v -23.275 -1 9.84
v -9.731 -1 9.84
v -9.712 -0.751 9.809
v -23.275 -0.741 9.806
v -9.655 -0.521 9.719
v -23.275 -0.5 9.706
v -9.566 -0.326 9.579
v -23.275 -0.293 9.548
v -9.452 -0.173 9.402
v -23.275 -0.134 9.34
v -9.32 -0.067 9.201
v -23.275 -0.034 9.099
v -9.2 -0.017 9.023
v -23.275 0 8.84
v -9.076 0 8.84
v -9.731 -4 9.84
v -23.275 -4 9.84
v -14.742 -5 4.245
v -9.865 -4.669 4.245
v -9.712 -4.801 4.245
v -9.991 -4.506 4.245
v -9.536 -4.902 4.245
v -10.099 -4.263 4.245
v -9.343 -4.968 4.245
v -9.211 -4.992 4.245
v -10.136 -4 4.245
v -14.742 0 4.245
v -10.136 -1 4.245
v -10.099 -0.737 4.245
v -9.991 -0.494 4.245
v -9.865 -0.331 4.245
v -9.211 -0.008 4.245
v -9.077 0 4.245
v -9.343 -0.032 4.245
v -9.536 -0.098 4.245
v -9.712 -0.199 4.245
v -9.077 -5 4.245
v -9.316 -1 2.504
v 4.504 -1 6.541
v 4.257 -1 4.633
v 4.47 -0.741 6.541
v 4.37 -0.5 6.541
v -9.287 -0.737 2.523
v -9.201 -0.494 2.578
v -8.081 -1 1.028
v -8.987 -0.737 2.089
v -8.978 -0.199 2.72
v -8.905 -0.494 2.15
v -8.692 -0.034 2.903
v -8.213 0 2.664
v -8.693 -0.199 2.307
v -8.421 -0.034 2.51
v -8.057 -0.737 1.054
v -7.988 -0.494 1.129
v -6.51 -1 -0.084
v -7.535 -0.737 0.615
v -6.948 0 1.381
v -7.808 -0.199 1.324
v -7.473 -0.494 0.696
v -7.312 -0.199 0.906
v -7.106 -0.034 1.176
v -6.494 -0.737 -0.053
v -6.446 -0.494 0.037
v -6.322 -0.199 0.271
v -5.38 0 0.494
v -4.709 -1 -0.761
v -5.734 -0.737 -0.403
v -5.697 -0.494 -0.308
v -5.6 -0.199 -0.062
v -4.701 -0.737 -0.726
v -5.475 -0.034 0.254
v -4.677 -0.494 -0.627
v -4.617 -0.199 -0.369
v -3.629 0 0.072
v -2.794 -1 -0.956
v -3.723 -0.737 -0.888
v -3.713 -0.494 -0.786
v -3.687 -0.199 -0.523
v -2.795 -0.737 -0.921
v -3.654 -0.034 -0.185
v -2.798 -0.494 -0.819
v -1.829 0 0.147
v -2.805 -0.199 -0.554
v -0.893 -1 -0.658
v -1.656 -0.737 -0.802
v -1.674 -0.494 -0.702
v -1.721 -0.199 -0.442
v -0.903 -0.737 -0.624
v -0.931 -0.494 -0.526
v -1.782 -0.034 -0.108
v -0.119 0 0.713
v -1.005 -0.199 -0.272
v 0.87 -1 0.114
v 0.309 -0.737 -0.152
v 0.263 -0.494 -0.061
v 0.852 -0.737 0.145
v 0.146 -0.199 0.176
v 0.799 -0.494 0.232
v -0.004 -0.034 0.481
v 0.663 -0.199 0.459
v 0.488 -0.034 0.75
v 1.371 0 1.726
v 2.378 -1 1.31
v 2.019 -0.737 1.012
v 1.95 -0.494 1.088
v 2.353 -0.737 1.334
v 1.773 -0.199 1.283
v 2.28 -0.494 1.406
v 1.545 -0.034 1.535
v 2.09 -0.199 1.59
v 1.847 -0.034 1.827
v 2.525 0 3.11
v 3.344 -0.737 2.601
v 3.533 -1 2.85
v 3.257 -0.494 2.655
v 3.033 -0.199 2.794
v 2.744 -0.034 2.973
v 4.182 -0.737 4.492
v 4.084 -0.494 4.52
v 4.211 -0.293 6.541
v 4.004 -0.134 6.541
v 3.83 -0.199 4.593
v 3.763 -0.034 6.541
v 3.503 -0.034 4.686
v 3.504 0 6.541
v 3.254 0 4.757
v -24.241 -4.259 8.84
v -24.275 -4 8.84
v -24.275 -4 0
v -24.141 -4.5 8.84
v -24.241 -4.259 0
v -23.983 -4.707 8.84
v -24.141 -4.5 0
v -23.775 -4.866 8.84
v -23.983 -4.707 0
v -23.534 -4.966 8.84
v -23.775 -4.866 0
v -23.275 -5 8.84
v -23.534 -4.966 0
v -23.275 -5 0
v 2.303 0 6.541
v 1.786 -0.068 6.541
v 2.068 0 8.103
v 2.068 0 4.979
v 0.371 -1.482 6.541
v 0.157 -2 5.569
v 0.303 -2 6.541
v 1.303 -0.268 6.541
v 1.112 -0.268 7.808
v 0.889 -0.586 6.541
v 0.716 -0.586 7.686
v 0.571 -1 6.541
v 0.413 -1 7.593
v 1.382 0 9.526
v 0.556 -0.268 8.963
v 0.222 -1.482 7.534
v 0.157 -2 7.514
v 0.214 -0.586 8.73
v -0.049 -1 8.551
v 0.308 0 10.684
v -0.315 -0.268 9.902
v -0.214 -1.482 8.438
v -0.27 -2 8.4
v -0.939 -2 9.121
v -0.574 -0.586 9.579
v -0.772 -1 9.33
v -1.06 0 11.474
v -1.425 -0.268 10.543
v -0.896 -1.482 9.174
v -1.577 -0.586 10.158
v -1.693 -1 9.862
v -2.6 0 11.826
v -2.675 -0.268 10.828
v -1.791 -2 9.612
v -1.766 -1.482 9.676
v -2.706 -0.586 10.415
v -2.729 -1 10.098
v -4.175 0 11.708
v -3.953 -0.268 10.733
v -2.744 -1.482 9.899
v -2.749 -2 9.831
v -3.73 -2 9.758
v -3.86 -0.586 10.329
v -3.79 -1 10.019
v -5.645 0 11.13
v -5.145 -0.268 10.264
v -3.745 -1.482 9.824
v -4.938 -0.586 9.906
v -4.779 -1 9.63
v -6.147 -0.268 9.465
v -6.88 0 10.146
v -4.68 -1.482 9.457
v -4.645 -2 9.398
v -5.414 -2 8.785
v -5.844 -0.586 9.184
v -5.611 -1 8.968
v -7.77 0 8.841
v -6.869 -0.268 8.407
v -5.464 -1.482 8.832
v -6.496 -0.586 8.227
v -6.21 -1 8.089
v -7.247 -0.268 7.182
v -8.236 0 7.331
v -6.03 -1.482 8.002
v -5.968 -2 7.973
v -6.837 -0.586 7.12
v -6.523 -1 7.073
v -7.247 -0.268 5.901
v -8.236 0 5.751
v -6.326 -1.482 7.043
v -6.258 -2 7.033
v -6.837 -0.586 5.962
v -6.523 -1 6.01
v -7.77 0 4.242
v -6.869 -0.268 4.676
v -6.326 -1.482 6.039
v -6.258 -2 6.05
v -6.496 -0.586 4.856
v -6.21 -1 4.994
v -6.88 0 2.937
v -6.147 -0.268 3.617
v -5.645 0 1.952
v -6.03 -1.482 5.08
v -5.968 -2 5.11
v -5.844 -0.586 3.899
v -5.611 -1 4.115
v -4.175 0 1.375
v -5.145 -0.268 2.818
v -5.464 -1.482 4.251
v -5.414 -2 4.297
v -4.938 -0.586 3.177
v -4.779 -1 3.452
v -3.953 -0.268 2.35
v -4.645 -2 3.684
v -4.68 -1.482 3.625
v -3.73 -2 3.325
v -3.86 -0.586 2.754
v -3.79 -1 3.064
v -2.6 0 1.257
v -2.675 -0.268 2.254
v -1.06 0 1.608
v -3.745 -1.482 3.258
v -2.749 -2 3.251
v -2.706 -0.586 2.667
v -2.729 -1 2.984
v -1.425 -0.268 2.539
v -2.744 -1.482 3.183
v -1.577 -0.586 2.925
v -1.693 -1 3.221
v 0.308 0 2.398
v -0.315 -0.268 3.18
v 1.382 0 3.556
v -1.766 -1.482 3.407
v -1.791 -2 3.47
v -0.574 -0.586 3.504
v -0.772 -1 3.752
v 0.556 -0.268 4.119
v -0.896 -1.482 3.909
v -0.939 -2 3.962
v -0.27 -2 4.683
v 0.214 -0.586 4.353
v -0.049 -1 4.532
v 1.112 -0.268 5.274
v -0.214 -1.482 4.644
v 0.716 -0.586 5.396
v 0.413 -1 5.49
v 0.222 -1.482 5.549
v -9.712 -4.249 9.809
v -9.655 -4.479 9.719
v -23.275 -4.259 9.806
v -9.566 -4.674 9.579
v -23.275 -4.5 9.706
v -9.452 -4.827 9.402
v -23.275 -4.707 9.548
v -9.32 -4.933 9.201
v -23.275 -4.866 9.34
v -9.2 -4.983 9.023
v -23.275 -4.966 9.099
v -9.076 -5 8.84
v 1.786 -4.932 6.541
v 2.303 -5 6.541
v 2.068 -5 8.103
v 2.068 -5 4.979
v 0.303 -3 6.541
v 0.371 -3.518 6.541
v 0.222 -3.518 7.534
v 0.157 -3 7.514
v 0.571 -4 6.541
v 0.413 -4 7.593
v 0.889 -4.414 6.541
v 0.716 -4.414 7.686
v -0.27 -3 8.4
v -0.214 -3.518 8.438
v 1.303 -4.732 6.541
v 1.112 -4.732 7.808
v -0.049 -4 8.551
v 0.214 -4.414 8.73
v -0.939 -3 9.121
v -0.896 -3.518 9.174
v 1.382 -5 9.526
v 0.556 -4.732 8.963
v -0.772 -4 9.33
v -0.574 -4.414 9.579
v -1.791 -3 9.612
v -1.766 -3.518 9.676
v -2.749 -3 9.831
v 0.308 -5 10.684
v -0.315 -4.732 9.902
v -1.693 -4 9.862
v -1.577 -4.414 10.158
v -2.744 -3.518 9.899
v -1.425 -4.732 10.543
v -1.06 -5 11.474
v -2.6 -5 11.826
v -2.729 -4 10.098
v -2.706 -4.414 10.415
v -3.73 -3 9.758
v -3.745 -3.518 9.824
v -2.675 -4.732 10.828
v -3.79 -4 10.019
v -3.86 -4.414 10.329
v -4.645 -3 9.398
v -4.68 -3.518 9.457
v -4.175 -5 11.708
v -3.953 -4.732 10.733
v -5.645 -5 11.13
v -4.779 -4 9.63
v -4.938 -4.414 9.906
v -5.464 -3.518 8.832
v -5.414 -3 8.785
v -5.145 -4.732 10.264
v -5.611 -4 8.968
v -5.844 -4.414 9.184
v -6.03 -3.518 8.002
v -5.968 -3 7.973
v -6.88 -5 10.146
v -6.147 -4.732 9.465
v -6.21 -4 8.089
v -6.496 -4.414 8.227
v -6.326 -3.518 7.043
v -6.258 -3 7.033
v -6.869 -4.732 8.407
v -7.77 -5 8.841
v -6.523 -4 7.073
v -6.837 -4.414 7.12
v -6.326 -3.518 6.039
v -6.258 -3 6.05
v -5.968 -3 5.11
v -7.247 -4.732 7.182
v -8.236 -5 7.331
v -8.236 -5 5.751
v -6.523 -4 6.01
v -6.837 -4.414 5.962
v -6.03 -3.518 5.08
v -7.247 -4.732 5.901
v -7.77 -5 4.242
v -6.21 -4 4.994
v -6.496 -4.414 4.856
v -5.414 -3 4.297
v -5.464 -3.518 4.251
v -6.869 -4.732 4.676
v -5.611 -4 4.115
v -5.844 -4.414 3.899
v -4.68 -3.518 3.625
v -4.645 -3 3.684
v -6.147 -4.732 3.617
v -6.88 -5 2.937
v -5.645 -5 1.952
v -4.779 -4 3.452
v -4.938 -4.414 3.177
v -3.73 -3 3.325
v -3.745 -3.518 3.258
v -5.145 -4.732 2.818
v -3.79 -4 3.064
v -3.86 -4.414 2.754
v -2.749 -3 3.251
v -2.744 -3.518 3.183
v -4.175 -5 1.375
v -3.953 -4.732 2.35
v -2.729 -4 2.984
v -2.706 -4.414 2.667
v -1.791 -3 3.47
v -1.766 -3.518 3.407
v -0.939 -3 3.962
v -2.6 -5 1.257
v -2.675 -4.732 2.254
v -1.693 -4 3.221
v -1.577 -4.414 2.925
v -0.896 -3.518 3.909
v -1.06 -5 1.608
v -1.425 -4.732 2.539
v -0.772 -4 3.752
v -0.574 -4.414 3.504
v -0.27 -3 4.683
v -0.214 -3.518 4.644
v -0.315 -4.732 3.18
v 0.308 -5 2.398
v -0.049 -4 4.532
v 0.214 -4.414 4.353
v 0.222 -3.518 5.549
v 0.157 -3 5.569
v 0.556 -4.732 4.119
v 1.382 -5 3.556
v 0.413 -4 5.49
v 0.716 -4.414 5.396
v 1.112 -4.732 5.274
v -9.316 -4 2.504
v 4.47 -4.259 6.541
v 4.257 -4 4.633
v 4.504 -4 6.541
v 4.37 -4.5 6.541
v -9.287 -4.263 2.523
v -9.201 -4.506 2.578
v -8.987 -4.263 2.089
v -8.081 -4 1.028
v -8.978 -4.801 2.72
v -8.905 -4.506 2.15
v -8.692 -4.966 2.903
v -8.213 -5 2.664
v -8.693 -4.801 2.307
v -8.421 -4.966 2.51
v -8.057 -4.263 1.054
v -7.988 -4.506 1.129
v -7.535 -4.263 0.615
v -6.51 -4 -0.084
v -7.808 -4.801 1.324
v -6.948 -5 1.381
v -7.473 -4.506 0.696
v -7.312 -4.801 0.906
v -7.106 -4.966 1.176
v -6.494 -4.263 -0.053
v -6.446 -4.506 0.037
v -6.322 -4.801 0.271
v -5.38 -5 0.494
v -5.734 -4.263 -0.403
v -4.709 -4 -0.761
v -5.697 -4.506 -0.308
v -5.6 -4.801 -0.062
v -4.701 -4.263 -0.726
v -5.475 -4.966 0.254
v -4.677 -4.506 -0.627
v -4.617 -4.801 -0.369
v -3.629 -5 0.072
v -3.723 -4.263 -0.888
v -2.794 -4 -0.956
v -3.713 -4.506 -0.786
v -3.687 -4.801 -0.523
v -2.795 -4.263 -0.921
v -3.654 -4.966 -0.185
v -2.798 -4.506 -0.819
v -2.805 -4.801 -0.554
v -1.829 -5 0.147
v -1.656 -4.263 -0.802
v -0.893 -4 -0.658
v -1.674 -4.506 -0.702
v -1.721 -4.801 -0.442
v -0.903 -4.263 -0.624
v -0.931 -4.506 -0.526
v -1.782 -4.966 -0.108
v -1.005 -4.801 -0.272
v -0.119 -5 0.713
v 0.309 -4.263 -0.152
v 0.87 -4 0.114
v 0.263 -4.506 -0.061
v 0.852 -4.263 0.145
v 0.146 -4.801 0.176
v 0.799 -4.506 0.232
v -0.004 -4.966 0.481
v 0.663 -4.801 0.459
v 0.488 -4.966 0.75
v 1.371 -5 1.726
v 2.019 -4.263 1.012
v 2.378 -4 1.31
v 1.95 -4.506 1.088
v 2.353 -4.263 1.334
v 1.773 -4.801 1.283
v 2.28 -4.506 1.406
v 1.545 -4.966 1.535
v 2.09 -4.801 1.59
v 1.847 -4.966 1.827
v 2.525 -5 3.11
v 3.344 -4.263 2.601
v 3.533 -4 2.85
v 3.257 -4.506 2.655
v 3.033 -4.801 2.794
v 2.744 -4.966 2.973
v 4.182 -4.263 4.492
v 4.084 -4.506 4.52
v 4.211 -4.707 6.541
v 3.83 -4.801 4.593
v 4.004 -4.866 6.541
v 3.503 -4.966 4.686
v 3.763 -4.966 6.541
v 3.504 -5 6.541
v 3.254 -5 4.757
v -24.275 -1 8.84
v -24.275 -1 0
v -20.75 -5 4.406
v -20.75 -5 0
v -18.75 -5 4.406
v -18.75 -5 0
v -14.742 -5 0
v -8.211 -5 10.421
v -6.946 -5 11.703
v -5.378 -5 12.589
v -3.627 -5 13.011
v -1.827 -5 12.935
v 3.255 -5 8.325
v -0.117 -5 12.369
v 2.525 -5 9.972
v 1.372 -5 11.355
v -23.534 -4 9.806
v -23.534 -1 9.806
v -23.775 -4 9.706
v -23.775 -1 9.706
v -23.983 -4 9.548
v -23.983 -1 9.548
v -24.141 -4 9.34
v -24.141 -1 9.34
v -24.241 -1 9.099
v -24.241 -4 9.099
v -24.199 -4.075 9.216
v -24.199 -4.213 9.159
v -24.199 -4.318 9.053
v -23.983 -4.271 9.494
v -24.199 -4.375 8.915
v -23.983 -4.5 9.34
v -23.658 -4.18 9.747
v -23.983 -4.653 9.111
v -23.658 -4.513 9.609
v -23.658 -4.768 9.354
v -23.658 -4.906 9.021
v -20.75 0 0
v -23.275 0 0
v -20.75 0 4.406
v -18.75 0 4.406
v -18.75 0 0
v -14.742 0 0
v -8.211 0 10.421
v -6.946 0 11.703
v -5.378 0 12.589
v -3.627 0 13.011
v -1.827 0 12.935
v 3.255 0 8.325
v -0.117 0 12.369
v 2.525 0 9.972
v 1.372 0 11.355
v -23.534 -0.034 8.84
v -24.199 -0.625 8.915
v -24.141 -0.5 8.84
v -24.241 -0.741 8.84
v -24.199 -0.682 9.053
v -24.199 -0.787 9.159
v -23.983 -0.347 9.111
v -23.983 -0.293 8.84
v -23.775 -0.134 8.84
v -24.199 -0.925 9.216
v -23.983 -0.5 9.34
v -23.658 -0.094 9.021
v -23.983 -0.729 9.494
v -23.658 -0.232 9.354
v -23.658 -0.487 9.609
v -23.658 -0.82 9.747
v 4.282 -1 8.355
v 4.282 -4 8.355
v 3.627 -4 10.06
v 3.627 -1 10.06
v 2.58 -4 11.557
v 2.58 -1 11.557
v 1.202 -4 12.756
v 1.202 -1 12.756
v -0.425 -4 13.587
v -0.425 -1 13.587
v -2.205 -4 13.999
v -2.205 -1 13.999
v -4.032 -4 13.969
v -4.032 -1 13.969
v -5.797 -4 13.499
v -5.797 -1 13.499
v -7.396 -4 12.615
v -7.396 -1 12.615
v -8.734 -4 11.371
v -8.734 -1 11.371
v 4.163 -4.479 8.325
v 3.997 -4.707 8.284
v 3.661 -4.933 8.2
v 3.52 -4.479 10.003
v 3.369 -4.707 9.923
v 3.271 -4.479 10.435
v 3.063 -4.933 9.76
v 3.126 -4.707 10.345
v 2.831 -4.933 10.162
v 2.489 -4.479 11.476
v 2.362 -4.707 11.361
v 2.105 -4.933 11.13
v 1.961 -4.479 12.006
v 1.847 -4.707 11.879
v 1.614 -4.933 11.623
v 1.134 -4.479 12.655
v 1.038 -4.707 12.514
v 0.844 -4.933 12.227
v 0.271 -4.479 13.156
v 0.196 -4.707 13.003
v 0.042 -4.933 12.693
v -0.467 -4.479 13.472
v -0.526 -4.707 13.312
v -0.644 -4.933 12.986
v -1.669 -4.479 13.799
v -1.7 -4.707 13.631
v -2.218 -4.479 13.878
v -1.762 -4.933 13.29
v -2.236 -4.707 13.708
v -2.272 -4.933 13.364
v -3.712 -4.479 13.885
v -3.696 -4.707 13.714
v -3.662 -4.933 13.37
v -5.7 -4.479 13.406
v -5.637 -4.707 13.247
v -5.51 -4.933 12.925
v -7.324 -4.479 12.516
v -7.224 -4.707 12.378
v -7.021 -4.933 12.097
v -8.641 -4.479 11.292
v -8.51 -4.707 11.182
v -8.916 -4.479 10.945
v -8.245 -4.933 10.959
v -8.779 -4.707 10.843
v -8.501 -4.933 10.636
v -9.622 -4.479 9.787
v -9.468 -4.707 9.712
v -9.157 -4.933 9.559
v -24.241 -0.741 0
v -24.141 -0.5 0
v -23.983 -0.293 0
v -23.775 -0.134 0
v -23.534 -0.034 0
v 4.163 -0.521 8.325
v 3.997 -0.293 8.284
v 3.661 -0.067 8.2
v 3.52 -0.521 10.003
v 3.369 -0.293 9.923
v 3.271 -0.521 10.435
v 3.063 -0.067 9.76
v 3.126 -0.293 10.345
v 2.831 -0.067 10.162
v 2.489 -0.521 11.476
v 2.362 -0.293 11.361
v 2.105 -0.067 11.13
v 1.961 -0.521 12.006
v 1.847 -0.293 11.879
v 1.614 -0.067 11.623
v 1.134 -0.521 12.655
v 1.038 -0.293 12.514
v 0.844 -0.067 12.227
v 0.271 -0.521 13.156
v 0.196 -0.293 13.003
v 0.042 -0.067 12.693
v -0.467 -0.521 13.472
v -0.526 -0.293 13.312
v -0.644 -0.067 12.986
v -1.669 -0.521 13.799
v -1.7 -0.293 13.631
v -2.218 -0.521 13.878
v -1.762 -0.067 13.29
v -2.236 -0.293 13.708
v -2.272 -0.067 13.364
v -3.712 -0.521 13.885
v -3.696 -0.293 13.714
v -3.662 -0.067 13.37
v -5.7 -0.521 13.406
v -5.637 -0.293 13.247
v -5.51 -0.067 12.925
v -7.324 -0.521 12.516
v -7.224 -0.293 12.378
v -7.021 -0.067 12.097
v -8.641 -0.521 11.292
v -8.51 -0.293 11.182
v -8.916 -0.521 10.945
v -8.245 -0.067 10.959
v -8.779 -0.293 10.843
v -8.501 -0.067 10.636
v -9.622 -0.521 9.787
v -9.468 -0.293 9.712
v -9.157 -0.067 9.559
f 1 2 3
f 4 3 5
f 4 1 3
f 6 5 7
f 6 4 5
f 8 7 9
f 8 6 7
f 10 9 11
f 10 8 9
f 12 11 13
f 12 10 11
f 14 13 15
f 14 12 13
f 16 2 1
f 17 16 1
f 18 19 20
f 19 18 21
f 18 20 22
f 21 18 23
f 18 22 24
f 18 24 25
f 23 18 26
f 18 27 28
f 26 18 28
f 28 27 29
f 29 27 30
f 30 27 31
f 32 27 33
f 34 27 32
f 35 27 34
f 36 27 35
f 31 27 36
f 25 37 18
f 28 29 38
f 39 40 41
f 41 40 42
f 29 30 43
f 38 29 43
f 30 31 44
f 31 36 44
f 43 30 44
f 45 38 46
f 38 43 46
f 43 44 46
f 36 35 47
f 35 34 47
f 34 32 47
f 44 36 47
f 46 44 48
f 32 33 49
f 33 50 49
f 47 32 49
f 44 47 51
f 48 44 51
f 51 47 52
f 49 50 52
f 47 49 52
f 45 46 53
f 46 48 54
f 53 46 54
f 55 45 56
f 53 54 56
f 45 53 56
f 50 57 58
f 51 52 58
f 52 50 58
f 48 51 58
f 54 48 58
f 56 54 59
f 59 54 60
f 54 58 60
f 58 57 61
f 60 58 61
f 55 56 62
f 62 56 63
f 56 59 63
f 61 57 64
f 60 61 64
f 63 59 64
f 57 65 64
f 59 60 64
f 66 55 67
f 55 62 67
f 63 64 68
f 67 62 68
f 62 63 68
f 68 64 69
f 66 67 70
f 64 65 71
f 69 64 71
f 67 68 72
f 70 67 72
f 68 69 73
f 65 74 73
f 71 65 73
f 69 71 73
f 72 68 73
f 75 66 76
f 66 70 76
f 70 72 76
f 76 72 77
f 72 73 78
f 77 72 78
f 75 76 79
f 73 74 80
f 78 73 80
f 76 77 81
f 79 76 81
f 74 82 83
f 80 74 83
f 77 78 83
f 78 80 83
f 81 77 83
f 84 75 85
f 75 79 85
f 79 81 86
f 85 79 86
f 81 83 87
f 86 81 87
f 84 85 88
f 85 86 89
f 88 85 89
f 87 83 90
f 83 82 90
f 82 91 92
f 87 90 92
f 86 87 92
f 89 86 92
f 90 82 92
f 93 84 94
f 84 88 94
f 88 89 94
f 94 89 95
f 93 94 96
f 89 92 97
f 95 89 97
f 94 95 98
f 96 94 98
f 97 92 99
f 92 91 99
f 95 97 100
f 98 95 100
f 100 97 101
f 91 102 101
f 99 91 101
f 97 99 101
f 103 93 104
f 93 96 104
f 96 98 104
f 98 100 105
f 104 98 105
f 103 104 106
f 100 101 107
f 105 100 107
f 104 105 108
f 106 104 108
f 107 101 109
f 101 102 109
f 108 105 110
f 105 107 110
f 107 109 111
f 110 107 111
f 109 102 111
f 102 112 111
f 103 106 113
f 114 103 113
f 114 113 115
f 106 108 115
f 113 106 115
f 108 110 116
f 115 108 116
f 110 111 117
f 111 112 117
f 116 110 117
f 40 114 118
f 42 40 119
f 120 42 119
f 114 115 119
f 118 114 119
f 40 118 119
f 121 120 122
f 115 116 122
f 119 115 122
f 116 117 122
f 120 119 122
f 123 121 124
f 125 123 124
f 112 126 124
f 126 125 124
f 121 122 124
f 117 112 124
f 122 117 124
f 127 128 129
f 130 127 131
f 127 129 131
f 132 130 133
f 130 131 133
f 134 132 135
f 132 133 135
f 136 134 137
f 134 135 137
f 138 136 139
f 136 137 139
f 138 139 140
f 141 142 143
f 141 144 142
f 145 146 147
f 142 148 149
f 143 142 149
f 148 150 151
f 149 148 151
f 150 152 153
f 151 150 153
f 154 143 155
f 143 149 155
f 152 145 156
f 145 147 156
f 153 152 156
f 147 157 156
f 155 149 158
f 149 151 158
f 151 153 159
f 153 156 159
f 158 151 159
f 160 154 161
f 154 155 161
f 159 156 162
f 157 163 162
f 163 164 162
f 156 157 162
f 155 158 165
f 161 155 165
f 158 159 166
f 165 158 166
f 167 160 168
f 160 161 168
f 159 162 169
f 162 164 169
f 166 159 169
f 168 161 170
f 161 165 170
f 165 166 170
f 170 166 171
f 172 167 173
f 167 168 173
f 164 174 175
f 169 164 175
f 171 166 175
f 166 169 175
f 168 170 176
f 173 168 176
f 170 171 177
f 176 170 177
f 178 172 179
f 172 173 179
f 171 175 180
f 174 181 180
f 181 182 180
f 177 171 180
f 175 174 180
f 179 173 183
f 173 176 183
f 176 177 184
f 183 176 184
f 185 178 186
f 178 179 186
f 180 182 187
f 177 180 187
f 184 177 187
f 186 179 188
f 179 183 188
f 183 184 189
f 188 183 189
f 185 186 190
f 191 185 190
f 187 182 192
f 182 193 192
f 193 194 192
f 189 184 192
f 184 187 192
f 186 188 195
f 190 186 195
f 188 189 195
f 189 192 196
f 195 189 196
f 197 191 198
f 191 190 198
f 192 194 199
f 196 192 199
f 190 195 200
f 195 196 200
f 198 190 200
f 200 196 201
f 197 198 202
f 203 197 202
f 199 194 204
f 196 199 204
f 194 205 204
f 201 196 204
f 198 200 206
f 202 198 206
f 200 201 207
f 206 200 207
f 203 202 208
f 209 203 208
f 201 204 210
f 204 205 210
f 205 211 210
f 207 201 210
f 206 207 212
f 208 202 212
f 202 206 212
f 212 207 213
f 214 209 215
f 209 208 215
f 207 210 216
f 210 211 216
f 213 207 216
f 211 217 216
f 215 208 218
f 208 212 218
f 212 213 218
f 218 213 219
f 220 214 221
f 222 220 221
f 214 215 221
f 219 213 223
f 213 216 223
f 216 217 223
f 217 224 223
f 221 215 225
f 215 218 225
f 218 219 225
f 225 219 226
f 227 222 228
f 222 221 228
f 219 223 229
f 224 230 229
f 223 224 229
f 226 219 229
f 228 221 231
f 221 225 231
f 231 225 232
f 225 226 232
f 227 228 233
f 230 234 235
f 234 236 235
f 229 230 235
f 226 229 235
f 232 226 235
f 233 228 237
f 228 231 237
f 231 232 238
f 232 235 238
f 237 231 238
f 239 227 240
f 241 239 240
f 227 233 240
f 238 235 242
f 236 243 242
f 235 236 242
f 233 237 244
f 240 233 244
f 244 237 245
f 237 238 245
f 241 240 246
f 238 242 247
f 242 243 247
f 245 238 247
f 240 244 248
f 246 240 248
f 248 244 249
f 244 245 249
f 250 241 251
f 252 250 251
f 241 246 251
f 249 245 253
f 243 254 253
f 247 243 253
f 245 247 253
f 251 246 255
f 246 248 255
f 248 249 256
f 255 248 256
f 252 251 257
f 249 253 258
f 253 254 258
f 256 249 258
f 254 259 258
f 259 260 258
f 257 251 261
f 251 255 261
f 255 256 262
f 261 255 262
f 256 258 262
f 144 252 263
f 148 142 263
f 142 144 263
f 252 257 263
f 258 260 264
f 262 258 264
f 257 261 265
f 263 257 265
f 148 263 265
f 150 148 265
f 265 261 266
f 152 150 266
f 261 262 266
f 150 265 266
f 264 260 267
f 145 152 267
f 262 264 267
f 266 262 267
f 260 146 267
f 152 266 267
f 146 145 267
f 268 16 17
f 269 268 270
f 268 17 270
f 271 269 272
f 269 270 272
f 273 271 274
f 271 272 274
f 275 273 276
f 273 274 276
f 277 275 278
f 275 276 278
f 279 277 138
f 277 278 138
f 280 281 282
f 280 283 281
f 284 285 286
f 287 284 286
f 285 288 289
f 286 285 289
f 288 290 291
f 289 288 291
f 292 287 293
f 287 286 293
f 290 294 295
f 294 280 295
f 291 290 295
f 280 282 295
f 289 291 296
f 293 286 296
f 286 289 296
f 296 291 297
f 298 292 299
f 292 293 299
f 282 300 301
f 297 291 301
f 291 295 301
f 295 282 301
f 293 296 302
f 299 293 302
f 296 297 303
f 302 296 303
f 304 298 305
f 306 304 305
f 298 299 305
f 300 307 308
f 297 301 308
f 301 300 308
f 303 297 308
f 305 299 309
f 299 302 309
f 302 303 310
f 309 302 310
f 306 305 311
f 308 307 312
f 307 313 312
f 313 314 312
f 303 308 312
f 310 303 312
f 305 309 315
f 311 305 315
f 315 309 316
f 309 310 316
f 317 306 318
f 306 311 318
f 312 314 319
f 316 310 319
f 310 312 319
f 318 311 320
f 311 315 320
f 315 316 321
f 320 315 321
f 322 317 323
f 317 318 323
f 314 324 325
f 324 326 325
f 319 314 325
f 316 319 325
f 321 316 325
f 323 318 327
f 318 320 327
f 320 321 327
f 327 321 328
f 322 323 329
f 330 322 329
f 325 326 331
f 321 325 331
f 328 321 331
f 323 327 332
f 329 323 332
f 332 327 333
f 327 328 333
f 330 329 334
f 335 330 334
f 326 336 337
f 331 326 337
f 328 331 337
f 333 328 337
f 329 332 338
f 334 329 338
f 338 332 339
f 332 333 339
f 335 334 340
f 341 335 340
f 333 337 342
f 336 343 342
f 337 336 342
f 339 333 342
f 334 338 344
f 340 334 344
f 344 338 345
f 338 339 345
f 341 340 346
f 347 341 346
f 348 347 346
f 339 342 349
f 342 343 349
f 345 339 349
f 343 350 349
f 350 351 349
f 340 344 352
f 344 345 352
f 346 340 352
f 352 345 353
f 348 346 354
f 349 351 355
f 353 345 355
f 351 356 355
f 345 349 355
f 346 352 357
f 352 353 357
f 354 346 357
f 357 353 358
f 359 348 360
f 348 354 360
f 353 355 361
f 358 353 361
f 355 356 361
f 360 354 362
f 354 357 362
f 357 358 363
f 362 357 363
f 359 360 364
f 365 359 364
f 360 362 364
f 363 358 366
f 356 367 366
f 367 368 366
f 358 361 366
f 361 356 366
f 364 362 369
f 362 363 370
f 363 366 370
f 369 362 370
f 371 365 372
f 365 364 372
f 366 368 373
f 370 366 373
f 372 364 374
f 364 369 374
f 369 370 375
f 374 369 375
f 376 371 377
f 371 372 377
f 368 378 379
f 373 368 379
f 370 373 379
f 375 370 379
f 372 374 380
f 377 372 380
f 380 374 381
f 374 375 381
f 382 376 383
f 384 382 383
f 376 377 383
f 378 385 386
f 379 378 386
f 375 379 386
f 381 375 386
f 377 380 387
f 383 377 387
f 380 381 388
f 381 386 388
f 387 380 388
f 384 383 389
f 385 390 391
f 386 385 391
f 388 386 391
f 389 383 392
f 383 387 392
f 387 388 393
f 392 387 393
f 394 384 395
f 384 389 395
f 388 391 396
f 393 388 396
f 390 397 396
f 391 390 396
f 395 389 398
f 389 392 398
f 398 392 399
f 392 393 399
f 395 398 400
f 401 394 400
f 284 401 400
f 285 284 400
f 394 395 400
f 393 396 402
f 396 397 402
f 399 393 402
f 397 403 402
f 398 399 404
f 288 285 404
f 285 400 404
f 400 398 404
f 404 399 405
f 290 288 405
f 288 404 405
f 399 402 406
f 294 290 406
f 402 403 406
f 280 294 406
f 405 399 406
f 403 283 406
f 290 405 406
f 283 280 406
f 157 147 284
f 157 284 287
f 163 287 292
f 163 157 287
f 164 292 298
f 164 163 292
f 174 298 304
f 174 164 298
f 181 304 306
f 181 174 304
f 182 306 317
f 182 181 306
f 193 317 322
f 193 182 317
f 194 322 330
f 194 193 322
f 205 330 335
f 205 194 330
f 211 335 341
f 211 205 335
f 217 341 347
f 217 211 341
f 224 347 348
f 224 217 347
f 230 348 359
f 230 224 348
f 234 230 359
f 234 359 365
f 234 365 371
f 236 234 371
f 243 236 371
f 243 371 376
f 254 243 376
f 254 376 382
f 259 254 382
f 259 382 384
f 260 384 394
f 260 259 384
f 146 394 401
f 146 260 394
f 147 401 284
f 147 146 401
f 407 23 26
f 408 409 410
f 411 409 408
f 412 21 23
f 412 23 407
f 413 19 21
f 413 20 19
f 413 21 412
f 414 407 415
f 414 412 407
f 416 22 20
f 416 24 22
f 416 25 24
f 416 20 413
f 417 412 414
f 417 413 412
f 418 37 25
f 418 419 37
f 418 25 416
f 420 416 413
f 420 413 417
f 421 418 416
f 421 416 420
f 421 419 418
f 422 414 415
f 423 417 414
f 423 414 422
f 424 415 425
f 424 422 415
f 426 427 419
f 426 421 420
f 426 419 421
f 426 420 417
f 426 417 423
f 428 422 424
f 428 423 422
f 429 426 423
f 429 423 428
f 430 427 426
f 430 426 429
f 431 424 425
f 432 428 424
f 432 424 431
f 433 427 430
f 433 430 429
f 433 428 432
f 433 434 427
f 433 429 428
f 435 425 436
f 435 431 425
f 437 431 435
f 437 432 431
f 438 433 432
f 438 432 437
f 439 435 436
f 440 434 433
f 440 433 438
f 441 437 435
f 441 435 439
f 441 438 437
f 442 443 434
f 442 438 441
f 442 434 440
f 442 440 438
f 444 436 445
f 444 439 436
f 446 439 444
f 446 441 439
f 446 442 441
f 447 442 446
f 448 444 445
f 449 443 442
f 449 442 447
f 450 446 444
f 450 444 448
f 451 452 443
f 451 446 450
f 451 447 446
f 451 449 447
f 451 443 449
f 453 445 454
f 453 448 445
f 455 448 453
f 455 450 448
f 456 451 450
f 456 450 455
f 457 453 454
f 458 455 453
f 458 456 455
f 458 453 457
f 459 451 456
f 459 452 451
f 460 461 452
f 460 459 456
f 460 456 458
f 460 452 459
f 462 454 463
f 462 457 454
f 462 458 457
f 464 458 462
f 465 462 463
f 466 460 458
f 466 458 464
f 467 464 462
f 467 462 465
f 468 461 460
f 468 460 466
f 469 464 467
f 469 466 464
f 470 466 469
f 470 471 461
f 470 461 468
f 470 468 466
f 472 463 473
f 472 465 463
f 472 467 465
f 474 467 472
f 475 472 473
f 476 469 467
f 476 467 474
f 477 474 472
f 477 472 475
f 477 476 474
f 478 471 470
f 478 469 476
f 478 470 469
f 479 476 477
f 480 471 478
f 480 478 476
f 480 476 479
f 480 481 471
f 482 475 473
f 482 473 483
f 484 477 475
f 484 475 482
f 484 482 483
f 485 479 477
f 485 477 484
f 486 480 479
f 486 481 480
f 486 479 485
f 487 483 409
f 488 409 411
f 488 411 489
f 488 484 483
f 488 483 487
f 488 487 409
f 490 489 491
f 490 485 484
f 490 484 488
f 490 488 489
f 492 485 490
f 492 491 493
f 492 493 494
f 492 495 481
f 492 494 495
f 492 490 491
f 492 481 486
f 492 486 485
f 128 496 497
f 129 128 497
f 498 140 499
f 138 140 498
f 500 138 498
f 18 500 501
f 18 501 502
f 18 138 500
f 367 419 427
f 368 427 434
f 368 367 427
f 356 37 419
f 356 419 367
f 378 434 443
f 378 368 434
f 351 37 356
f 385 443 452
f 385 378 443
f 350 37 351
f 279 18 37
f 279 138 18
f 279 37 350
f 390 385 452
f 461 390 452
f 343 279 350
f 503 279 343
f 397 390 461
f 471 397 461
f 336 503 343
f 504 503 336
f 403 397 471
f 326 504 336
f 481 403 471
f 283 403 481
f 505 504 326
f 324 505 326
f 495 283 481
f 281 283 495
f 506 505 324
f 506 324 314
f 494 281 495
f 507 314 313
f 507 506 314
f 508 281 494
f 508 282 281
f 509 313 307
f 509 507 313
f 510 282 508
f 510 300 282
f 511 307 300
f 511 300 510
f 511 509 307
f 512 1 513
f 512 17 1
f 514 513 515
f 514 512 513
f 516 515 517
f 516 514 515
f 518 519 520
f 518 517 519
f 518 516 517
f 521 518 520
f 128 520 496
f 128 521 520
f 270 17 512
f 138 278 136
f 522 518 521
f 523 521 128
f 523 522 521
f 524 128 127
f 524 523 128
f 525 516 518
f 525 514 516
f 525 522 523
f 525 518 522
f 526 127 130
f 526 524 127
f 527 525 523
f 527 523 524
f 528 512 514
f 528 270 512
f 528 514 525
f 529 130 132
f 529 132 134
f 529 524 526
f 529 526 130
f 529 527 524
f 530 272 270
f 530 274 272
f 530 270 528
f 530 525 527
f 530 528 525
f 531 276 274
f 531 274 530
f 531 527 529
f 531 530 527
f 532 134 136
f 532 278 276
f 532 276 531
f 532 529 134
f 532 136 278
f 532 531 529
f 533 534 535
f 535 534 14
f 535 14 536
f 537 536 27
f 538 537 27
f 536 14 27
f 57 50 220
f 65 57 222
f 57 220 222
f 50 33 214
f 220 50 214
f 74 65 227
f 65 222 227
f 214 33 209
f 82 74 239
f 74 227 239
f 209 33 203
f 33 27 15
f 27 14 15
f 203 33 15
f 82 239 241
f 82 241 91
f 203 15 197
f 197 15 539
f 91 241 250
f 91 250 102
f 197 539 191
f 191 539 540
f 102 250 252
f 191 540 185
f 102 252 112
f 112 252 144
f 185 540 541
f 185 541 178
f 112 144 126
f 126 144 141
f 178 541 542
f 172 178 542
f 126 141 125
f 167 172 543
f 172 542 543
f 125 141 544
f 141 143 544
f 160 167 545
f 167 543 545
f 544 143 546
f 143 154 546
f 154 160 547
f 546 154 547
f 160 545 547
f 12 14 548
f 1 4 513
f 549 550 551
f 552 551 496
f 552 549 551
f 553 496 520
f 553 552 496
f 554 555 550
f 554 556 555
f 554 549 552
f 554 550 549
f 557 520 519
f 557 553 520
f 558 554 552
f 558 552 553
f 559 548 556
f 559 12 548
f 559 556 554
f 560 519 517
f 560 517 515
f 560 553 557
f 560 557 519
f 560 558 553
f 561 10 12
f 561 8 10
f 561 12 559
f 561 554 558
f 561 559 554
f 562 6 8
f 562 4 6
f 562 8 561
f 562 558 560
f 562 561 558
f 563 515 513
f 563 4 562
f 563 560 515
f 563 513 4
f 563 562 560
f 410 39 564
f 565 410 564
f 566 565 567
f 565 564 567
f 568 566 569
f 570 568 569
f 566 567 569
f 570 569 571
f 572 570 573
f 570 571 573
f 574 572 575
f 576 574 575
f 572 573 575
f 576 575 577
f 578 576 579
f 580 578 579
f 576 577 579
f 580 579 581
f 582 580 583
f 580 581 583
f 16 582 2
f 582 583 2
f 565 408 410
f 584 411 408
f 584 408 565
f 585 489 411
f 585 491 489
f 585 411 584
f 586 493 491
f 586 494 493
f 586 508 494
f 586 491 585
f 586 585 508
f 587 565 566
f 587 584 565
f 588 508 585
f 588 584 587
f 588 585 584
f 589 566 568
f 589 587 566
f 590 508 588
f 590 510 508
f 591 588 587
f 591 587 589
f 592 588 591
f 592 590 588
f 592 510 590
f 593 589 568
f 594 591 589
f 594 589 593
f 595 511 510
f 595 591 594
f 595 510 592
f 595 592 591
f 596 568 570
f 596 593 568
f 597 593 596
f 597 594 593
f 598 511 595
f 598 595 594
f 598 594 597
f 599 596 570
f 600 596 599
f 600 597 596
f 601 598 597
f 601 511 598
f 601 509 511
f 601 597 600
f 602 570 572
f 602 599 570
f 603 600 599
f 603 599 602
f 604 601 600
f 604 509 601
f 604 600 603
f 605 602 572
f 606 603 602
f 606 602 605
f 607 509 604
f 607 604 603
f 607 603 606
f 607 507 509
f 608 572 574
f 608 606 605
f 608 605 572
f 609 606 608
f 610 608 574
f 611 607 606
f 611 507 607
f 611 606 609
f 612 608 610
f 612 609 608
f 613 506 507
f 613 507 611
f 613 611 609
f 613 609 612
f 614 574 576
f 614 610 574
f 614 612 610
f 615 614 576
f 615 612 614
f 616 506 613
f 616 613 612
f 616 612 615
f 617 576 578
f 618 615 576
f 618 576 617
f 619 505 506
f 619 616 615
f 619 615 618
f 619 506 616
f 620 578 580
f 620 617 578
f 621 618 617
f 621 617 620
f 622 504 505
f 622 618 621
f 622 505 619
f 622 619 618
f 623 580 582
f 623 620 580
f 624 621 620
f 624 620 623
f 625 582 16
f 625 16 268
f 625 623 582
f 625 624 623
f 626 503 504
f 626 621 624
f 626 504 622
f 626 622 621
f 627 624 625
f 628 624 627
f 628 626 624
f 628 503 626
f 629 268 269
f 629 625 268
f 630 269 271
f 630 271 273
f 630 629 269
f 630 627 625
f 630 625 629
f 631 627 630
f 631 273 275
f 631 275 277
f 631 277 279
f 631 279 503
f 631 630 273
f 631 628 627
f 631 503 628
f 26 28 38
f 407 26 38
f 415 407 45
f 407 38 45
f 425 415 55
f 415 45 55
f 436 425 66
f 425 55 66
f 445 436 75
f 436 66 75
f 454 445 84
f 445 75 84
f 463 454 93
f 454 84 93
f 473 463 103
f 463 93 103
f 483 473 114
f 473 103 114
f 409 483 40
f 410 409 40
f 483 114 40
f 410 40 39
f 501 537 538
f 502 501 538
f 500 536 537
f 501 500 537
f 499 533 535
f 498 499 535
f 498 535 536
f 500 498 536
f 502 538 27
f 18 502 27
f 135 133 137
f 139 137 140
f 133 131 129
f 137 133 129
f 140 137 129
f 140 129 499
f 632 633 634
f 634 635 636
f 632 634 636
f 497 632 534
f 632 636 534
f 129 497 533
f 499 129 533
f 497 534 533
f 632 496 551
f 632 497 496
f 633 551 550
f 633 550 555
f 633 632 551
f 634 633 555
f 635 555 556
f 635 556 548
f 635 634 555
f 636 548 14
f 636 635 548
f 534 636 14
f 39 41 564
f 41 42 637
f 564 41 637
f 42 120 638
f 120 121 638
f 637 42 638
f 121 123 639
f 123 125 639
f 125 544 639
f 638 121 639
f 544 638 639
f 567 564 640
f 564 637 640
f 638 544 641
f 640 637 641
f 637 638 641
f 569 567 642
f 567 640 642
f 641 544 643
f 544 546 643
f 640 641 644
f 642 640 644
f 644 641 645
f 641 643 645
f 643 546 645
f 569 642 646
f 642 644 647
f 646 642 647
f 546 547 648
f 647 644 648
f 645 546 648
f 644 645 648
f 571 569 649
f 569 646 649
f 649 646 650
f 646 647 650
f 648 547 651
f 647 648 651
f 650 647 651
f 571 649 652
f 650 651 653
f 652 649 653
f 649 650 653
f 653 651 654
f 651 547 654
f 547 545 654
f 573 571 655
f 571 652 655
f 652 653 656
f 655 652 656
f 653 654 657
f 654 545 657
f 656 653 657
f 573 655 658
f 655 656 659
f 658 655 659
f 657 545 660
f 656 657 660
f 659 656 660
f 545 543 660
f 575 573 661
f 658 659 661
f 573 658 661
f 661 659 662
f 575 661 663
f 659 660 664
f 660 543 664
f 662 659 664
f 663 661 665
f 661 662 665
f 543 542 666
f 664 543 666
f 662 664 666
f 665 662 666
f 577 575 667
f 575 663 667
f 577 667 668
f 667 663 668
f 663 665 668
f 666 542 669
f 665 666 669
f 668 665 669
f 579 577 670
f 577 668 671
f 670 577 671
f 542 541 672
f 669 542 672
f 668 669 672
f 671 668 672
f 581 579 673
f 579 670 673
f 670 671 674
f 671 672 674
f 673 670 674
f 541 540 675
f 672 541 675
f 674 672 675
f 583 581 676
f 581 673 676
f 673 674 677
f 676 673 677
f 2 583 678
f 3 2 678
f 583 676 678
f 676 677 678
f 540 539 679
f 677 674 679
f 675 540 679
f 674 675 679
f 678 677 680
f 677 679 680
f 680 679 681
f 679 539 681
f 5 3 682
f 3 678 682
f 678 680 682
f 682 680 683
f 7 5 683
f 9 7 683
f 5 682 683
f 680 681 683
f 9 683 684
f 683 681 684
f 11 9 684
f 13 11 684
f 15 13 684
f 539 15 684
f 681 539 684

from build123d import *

# Parameters (mm, degrees)
F0_R     = 3.299151
F1_DEPTH = 5
F2_R     = 1
F3_R     = 2
F4_R     = 2


with BuildPart() as f1:
    # F0 (on Front) → F1 (new body)
    with BuildSketch(Plane.XZ):
        with BuildLine():
            ThreePointArc((-10.135779, 4.245207), (-10.476368, 7.082065), (-9.731289, 9.840438))
            Line((-9.731289, 9.840438), (-24.275417, 9.840438))
            Line((-24.275417, 9.840438), (-24.275417, 0))
            Line((-24.275417, 0), (-20.750272, 0))
            Line((-20.750272, 0), (-20.750272, 4.406432))
            Line((-20.750272, 4.406432), (-18.750272, 4.406432))
            Line((-18.750272, 4.406432), (-18.750272, 0))
            Line((-18.750272, 0), (-14.741508, 0))
            Line((-14.741508, 0), (-14.741508, 4.245207))
            Line((-14.741508, 4.245207), (-10.135779, 4.245207))
        make_face()
        with BuildLine():
            ThreePointArc((-10.135779, 4.245207), (-1.833816, -0.868138), (4.50411, 6.541287))
            ThreePointArc((4.50411, 6.541287), (-1.302593, 13.847637), (-9.731289, 9.840438))
            ThreePointArc((-9.731289, 9.840438), (-10.476368, 7.082065), (-10.135779, 4.245207))
        make_face()
        with Locations((-2.99589, 6.541287)):
            Circle(F0_R, mode=Mode.SUBTRACT)
    extrude(amount=F1_DEPTH)

    # F2
    f2_edges = [f1.edges().sort_by_distance(p)[0] for p in [
        (-17.003353, -5, 9.840438),
        (-17.003353, 0, 9.840438),
        (-24.275417, 0, 4.920219),
        (-24.275417, -2.5, 9.840438),
        (-24.275417, -5, 4.920219),
        (-1.833816, -5, -0.868138),
        (-1.302593, -5, 13.847637),
        (-1.833816, 0, -0.868138),
        (-1.302593, 0, 13.847637),
    ]]
    fillet(f2_edges, radius=F2_R)

    # F3
    f3_edges = [f1.edges().sort_by_distance(p)[0] for p in [
        (-6.295041, 0, 6.541287),
    ]]
    fillet(f3_edges, radius=F3_R)

    # F4
    f4_edges = [f1.edges().sort_by_distance(p)[0] for p in [
        (-6.295041, -5, 6.541287),
    ]]
    fillet(f4_edges, radius=F4_R)


solid = f1.part
